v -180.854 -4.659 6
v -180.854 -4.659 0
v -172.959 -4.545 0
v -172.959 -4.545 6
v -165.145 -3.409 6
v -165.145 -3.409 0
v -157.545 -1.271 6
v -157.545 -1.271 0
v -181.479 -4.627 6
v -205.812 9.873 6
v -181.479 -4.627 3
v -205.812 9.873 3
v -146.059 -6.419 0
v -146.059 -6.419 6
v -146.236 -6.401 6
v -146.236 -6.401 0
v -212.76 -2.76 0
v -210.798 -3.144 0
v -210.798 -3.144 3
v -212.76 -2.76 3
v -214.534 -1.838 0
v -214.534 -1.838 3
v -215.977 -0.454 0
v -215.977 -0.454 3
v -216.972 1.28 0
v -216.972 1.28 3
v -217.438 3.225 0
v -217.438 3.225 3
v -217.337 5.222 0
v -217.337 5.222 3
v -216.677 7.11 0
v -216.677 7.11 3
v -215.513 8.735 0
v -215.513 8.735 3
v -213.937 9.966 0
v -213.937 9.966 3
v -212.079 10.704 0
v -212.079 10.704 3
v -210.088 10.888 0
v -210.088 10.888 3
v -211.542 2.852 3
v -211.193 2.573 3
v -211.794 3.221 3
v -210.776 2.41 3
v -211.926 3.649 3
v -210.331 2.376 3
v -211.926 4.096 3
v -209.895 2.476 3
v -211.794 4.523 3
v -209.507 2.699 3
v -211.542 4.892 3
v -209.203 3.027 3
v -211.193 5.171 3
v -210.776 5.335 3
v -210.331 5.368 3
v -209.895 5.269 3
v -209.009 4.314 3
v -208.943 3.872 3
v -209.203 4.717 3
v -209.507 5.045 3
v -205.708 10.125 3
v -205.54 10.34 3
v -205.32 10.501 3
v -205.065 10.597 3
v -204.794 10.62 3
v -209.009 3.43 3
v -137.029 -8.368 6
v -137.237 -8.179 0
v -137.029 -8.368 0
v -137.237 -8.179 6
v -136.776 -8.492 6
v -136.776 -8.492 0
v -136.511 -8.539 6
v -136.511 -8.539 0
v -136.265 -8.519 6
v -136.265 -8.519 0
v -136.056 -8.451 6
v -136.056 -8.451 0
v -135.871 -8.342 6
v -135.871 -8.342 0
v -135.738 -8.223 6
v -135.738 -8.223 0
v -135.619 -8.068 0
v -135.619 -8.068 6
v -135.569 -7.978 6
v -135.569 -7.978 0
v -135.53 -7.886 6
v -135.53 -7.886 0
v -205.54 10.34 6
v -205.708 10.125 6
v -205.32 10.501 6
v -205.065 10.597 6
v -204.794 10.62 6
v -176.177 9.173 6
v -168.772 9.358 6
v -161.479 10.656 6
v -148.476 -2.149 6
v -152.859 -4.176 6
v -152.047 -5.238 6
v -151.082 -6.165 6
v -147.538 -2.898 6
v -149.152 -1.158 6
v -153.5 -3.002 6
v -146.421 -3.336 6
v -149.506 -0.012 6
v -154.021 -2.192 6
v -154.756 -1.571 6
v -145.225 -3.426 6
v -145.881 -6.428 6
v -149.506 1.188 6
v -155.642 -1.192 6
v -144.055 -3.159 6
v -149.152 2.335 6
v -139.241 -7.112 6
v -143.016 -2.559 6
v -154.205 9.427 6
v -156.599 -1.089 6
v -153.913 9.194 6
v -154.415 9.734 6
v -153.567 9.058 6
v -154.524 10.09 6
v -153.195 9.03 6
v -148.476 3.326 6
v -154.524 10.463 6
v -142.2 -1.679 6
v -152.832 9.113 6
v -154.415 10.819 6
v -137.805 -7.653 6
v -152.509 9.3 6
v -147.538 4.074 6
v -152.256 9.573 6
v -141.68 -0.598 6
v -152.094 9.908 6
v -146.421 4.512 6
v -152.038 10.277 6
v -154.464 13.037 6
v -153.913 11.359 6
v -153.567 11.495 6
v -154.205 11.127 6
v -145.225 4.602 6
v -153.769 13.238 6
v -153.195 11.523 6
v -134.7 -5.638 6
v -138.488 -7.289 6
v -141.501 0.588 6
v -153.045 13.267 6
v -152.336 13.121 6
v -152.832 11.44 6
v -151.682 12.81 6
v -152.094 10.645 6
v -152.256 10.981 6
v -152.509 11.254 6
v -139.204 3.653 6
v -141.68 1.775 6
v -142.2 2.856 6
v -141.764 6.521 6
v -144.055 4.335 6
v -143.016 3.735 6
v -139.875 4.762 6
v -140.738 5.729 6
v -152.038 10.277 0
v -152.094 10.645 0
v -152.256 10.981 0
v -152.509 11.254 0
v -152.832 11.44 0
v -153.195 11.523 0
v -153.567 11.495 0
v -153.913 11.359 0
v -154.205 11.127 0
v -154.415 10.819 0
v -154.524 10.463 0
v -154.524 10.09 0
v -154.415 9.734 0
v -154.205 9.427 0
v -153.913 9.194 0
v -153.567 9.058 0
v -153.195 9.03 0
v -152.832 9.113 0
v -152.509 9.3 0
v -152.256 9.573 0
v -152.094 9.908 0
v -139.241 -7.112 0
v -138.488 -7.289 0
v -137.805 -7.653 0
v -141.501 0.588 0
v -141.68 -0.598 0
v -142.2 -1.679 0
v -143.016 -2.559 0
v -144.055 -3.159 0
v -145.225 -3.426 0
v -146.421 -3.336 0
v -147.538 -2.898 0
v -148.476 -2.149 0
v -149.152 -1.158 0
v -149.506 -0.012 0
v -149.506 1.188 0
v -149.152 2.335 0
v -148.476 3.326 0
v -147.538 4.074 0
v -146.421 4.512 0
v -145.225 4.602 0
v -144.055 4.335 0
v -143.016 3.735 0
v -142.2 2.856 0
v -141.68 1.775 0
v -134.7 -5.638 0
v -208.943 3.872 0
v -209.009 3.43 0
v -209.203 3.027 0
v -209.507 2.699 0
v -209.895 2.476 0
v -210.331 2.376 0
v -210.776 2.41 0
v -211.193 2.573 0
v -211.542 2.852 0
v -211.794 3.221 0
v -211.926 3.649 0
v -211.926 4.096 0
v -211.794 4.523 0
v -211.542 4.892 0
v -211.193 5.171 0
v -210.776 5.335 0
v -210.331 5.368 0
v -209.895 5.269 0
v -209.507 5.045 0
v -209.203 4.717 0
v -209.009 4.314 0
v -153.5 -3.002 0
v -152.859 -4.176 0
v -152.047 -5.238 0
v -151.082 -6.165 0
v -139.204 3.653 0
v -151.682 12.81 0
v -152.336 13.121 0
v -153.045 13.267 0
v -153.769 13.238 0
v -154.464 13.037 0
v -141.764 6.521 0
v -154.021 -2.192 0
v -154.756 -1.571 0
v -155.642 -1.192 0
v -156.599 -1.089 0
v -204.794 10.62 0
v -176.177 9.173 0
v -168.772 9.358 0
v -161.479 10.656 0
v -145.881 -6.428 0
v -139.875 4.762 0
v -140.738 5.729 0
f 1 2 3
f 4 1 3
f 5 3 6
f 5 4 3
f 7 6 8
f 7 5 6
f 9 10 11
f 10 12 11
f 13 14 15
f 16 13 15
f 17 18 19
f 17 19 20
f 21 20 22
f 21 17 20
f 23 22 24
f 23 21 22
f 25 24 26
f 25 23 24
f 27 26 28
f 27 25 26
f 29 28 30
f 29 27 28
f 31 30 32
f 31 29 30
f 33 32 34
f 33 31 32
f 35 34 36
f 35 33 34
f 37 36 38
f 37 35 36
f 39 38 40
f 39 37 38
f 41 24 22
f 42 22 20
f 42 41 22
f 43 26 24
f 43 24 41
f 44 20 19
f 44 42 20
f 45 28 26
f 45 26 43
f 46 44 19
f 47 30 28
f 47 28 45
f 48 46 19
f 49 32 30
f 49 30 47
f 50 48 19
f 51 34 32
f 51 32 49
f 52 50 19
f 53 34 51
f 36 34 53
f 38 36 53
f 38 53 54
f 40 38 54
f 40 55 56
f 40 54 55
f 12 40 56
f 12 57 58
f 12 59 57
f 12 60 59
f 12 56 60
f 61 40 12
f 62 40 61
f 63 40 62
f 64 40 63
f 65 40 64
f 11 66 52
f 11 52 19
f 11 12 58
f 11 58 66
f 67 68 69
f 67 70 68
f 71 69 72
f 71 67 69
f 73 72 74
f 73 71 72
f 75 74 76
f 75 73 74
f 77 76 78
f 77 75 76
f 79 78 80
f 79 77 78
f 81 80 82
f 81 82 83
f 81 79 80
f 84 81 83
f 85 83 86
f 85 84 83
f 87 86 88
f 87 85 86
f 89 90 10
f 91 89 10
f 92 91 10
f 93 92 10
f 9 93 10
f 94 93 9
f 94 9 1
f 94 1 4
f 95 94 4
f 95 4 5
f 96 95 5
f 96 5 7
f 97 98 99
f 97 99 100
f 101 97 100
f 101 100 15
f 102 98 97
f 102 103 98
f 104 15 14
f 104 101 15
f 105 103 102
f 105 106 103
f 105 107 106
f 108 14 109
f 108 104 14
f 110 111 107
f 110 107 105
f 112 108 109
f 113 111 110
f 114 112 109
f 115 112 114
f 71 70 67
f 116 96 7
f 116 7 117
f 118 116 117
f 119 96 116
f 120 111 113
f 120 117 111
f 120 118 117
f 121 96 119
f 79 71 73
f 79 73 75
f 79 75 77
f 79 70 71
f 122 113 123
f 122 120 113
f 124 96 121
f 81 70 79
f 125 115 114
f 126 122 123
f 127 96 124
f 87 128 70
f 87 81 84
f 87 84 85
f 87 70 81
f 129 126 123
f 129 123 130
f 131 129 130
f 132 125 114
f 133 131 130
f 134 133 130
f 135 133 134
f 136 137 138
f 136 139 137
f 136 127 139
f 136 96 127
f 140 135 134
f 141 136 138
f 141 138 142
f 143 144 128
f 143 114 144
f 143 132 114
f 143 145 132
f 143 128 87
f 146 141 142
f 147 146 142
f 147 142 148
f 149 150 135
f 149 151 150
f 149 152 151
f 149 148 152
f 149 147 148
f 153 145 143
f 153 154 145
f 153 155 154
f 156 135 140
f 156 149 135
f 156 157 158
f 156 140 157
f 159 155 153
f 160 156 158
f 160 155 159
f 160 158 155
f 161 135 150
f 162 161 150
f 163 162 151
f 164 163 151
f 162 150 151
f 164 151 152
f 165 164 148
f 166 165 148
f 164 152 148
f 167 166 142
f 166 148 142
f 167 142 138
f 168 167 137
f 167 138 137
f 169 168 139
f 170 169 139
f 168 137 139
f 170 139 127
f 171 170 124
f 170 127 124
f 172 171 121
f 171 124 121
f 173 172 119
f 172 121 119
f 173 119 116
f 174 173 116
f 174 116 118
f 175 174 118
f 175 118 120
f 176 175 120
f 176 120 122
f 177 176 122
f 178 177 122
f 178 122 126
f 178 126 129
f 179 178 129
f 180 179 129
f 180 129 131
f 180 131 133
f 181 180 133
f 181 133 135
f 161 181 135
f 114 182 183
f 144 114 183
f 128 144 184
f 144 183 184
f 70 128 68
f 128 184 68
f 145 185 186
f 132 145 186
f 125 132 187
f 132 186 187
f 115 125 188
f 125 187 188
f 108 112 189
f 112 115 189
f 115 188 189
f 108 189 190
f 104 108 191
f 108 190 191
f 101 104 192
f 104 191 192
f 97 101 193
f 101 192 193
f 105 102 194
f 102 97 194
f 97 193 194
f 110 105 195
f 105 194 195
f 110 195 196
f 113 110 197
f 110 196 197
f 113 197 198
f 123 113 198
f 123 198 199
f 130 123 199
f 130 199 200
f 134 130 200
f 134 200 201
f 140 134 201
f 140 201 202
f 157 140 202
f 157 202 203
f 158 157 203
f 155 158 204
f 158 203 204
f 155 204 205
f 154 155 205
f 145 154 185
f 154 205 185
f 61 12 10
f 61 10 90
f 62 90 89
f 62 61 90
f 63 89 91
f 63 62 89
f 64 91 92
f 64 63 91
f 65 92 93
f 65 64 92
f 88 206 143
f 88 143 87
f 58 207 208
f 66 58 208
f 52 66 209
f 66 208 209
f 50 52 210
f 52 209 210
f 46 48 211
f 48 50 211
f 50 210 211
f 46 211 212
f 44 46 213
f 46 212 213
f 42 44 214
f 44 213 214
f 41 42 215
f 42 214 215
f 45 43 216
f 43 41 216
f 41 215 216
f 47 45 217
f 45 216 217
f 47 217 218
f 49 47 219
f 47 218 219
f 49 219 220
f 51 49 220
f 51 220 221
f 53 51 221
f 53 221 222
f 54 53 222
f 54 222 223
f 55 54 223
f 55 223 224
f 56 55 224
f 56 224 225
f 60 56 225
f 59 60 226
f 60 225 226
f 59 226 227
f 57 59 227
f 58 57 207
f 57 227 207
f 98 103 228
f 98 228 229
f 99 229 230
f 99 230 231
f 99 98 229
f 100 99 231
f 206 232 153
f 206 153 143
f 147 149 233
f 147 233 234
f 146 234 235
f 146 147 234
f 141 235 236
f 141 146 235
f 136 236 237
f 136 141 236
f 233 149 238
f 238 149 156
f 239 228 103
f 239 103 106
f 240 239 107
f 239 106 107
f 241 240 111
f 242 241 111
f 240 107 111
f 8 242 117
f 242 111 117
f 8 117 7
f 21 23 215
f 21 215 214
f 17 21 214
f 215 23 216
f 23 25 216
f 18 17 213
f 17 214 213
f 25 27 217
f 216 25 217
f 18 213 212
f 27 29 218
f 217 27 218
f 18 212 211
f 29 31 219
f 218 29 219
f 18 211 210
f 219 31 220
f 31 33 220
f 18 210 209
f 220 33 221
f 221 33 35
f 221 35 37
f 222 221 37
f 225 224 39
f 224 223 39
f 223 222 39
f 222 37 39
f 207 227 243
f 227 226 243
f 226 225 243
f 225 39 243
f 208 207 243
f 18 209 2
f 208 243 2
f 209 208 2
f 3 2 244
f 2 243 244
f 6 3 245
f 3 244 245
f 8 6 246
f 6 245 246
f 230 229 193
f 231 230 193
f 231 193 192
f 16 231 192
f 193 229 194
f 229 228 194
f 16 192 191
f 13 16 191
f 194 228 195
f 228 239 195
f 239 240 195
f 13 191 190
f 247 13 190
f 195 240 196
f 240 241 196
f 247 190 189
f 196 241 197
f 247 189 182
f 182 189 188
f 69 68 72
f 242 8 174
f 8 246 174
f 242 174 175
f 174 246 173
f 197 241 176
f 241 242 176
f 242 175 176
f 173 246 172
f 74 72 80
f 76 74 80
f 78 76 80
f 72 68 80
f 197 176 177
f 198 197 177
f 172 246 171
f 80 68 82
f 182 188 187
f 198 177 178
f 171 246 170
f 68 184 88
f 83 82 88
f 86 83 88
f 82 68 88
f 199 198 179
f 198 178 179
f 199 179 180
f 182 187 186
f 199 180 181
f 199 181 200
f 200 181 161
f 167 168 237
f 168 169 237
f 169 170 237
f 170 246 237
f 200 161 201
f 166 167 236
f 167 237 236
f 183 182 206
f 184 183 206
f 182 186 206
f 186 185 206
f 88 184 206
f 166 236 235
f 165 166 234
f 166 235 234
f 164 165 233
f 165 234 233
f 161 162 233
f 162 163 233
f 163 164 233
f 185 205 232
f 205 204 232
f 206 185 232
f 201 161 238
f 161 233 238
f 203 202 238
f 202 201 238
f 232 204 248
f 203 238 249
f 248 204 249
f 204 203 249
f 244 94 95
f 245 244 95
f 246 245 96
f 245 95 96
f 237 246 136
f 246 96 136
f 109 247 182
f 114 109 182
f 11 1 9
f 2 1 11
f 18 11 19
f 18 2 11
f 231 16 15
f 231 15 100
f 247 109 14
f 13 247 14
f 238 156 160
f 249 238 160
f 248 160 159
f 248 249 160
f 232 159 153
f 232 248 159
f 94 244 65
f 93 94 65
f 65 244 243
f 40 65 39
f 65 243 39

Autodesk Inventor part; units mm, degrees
ref_plane "YZ Plane" through (0, 0, 0) normal (1, 0, 0) x (0, 1, 0)
ref_plane "XZ Plane" through (0, 0, 0) normal (0, 1, 0) x (-1, 0, 0)
ref_plane "XY Plane" through (0, 0, 0) normal (0, 0, 1) x (1, 0, 0)
sketch "スケッチ1" plane through (0, 0, 0) normal (0, 0, 1) x (1, 0, 0)
  circle A0 centre (-145.5257, 0.5882) radius 1.5
  circle A1 centre (-139.5445, -10.0968) radius 1.5
  circle A2 centre (-105.5257, -16.4118) radius 30.1 construction
  line L0 (-170.915, -81.4118) -> (490.0044, -81.4118)
  circle A3 centre (-145.5257, 0.5882) radius 4.025
  circle A4 centre (-139.5445, -10.0968) radius 3
  circle A5 centre (-145.5257, 0.5882) radius 7.025
  line L1 (-146.2365, -6.4007) -> (-139.241, -7.1122)
  line L2 (-139.2044, 3.6529) -> (-134.6999, -5.6381)
  line L3 (-134.6999, -5.6381) -> (-136.7303, -11.1361)
  circle A6 centre (-105.5257, -16.4118) radius 31.1 construction
  line L4 (-145.1707, 7.6042) -> (-210.0877, 10.8882)
  line L5 (-145.8806, -6.4278) -> (-210.7976, -3.1438)
  circle A7 centre (-210.4427, 3.8722) radius 1.5
  circle A8 centre (-210.4427, 3.8722) radius 4.025
  circle A9 centre (-210.4427, 3.8722) radius 7.025
  circle A10 centre (-210.4427, 3.8722) radius 7.525
  line L6 (-206.5907, 10.3366) -> (-181.4786, -4.627)
  circle A11 centre (-199.4194, 13.3524) radius 1.25
  arc A12 (-199.5709, 10.3562) -> (-202.1936, 14.494) centre (-199.4194, 13.3524) ccw
  line L7 (-202.1936, 14.494) -> (-247.2482, 16.7732)
  arc A13 (-289.8377, 39.1951) -> (-247.2482, 16.7732) centre (-244.3571, 73.9244) ccw
  arc A14 (-289.8377, 39.1951) -> (-291.5649, 38.2266) centre (-290.6325, 38.5882) ccw
  arc A15 (-291.5649, 38.2266) -> (-251.8636, 4.9117) centre (-241.4172, 57.674) ccw
  line L8 (-251.8636, 4.9117) -> (-211.807, -3.019)
  line L9 (-209.3045, 11.3106) -> (-204.7936, 10.6204)
  arc A16 (-204.7936, 10.6204) -> (-205.5417, 8.9052) centre (-204.8441, 9.6217) ccw
  line L10 (-210.5022, 11.397) -> (-238.3358, 2.2334)
  point P0 (0, 0)
  point P1 (0, 0)
  point P2 (-146.0589, -6.4188)
  point P3 (-205.8121, 9.8726)
  dimension "d0" = 6
  dimension "d1" = 8.05
  dimension "d2" = 3
  dimension "d3" = 1
  dimension "d4" = 3
  dimension "d5" = 8.05
  dimension "d6" = 3
  dimension "d7" = 0.5
  dimension "d8" = 2.5
  dimension "d9" = 6
  dimension "d10" = 2
  dimension "d11" = 120
  dimension "d12" = 4
  dimension "d13" = 150
  dimension "d14" = 1
  dimension "d15" = 65
  dimension "d16" = 87.382
extrude "押し出し1" add sketch "スケッチ1" along normal blind 6 contours A4 L1 L5 A5 L2 L3 | L5 L6 A16 L4 A5 L1 | A5
extrude "押し出し2" add sketch "スケッチ1" along normal blind 3 contours L5 A10 A16 L6 | L5 A9 A16 A10 | A16 A10 L6 | L6 A10 L4 A16 | A9 | A10 A16 A9 L4 | A8
fillet "フィレット1" radius 1 1 edges at (-136.7303, -11.1361, 3)
sketch "スケッチ2" plane through (0, 0, 6) normal (0, 0, 1) x (1, 0, 0)
  line L0 (-210.7976, -3.1438) -> (-181.4786, -4.627) projected
  line L1 (-205.8121, 9.8726) -> (-181.4786, -4.627) projected
  arc A0 (-204.7936, 10.6204) -> (-205.8121, 9.8726) centre (-204.8441, 9.6217) ccw projected
  line L2 (-204.7936, 10.6204) -> (-210.0877, 10.8882) projected
  arc A1 (-210.0877, 10.8882) -> (-210.7976, -3.1438) centre (-210.4427, 3.8722) ccw projected
  circle A2 centre (-210.4427, 3.8722) radius 1.5 projected
  arc A3 (-137.2374, -8.1793) -> (-135.5302, -7.8865) centre (-136.4683, -7.5401) ccw projected
  line L3 (-135.5302, -7.8865) -> (-134.6999, -5.6381) projected
  line L4 (-134.6999, -5.6381) -> (-139.2044, 3.6529) projected
  arc A4 (-139.2044, 3.6529) -> (-145.1707, 7.6042) centre (-145.5257, 0.5882) ccw projected
  line L5 (-145.1707, 7.6042) -> (-204.7936, 10.6204) projected
  arc A5 (-204.7936, 10.6204) -> (-205.8121, 9.8726) centre (-204.8441, 9.6217) ccw projected
  line L6 (-205.8121, 9.8726) -> (-181.4786, -4.627) projected
  line L7 (-181.4786, -4.627) -> (-146.0589, -6.4188) projected
  line L8 (-146.0589, -6.4188) -> (-146.2365, -6.4007) projected
  arc A6 (-146.2365, -6.4007) -> (-145.8806, -6.4278) centre (-145.5257, 0.5882) ccw projected
  line L9 (-145.8806, -6.4278) -> (-146.0589, -6.4188) projected
  line L10 (-146.0589, -6.4188) -> (-139.241, -7.1122) projected
  arc A7 (-137.2374, -8.1793) -> (-139.241, -7.1122) centre (-139.5445, -10.0968) ccw projected
  circle A8 centre (-145.5257, 0.5882) radius 4.025 projected
  arc A9 (-204.7936, 10.6204) -> (-205.8121, 9.8726) centre (-204.8441, 9.6217) ccw projected
  line L11 (-204.6925, 12.6179) -> (-209.9867, 12.8857)
  arc A10 (-209.9867, 12.8857) -> (-210.8986, -5.1413) centre (-210.4427, 3.8722) ccw
  arc A11 (-182.0757, -6.5994) -> (-181.4786, -4.627) centre (-182.022, -5.539) ccw
  line L12 (-210.8986, -5.1413) -> (-182.0757, -6.5994)
  arc A12 (-204.7936, 10.6204) -> (-204.6925, 12.6179) centre (-204.743, 11.6191) ccw
  point P0 (0, 0)
  dimension "d22" = 2
sketch "スケッチ3" plane through (0, 0, 6) normal (0, 0, 1) x (1, 0, 0)
  arc A0 (-137.2374, -8.1793) -> (-135.5302, -7.8865) centre (-136.4683, -7.5401) ccw projected
  line L0 (-135.5302, -7.8865) -> (-134.6999, -5.6381) projected
  line L1 (-134.6999, -5.6381) -> (-139.2044, 3.6529) projected
  arc A1 (-139.2044, 3.6529) -> (-145.1707, 7.6042) centre (-145.5257, 0.5882) ccw projected
  line L2 (-145.1707, 7.6042) -> (-204.7936, 10.6204) projected
  arc A2 (-204.7936, 10.6204) -> (-205.8121, 9.8726) centre (-204.8441, 9.6217) ccw projected
  line L3 (-205.8121, 9.8726) -> (-181.4786, -4.627) projected
  line L4 (-181.4786, -4.627) -> (-146.0589, -6.4188) projected
  line L5 (-146.0589, -6.4188) -> (-146.2365, -6.4007) projected
  arc A3 (-146.2365, -6.4007) -> (-145.8806, -6.4278) centre (-145.5257, 0.5882) ccw projected
  line L6 (-145.8806, -6.4278) -> (-146.0589, -6.4188) projected
  line L7 (-146.0589, -6.4188) -> (-139.241, -7.1122) projected
  arc A4 (-137.2374, -8.1793) -> (-139.241, -7.1122) centre (-139.5445, -10.0968) ccw projected
  circle A5 centre (-145.5257, 0.5882) radius 4.025 projected
  point P0 (0, 0)
extrude "押し出し3" add sketch "スケッチ3" against normal blind 6 contours L5 A3 L6
sketch "スケッチ4" plane through (0, 0, 6) normal (0, 0, 1) x (1, 0, 0)
  line L0 (-146.0589, -6.4188) -> (-139.241, -7.1122) projected
  arc A0 (-137.2374, -8.1793) -> (-139.241, -7.1122) centre (-139.5445, -10.0968) ccw projected
  arc A1 (-137.2374, -8.1793) -> (-135.5302, -7.8865) centre (-136.4683, -7.5401) ccw projected
  line L1 (-135.5302, -7.8865) -> (-134.6999, -5.6381) projected
  line L2 (-134.6999, -5.6381) -> (-139.2044, 3.6529) projected
  arc A2 (-139.2044, 3.6529) -> (-145.1707, 7.6042) centre (-145.5257, 0.5882) ccw projected
  line L3 (-145.1707, 7.6042) -> (-204.7936, 10.6204) projected
  arc A3 (-204.7936, 10.6204) -> (-205.8121, 9.8726) centre (-204.8441, 9.6217) ccw projected
  line L4 (-205.8121, 9.8726) -> (-181.4786, -4.627) projected
  line L5 (-181.4786, -4.627) -> (-146.0589, -6.4188) projected
  circle A4 centre (-145.5257, 0.5882) radius 4.025 projected
  arc A5 (-153.4999, -3.002) -> (-157.5446, -1.2714) centre (-156.4634, -4.3363) ccw
  arc A6 (-180.854, -4.6586) -> (-157.5446, -1.2714) centre (-177.7808, 56.0903) ccw
  line L6 (-181.4786, -4.627) -> (-146.0589, -6.4188) projected
  circle A7 centre (-139.5445, -10.0968) radius 3 projected
  arc A8 (-153.4999, -3.002) -> (-151.0823, -6.1647) centre (-145.5257, 0.5882) ccw
  line L7 (-145.1707, 7.6042) -> (-204.7936, 10.6204) projected
  arc A9 (-176.1768, 9.1728) -> (-154.4643, 13.0367) centre (-173.6978, 58.1782) ccw
  arc A10 (-151.6818, 12.8103) -> (-154.4643, 13.0367) centre (-153.2884, 10.2768) ccw
  line L8 (-151.6818, 12.8103) -> (-141.7636, 6.5209)
  circle A11 centre (-153.2884, 10.2768) radius 1.25
  circle A12 centre (-139.5445, -10.0968) radius 3.5
  point P0 (0, 0)
  point P1 (-176.1768, 9.1728)
  dimension "d25" = 3.25
  dimension "d26" = 95
  dimension "d27" = 3
  dimension "d28" = 2.5
  dimension "d29" = 0.5
extrude "押し出し4" cut sketch "スケッチ4" against normal blind 6 contours L5 A6 A5 A8
extrude "押し出し5" add sketch "スケッチ4" against normal blind 6 contours A2 L3 A9 A10 L8
sketch "スケッチ5" plane through (0, 0, 6) normal (0, 0, 1) x (1, 0, 0)
  circle A0 centre (-153.2884, 10.2768) radius 1.25 projected
  circle A1 centre (-145.5257, 0.5882) radius 4.025 projected
  arc A2 (-180.854, -4.6586) -> (-157.5446, -1.2714) centre (-177.7808, 56.0903) ccw projected
  arc A3 (-153.4999, -3.002) -> (-157.5446, -1.2714) centre (-156.4634, -4.3363) ccw projected
  arc A4 (-153.4999, -3.002) -> (-151.0823, -6.1647) centre (-145.5257, 0.5882) ccw projected
  line L0 (-151.0823, -6.1647) -> (-146.0589, -6.4188) projected
  line L1 (-146.0589, -6.4188) -> (-139.241, -7.1122) projected
  arc A5 (-137.2374, -8.1793) -> (-139.241, -7.1122) centre (-139.5445, -10.0968) ccw projected
  arc A6 (-137.2374, -8.1793) -> (-135.5302, -7.8865) centre (-136.4683, -7.5401) ccw projected
  line L2 (-135.5302, -7.8865) -> (-134.6999, -5.6381) projected
  line L3 (-134.6999, -5.6381) -> (-139.2044, 3.6529) projected
  arc A7 (-139.2044, 3.6529) -> (-141.7636, 6.5209) centre (-145.5257, 0.5882) ccw projected
  line L4 (-141.7636, 6.5209) -> (-151.6818, 12.8103) projected
  arc A8 (-151.6818, 12.8103) -> (-154.4643, 13.0367) centre (-153.2884, 10.2768) ccw projected
  arc A9 (-176.1768, 9.1728) -> (-154.4643, 13.0367) centre (-173.6978, 58.1782) ccw projected
  line L5 (-176.1768, 9.1728) -> (-204.7936, 10.6204) projected
  arc A10 (-204.7936, 10.6204) -> (-205.8121, 9.8726) centre (-204.8441, 9.6217) ccw projected
  line L6 (-205.8121, 9.8726) -> (-181.4786, -4.627) projected
  line L7 (-181.4786, -4.627) -> (-180.854, -4.6586) projected
  line L8 (-204.7936, 10.6204) -> (-210.0877, 10.8882) projected
  arc A11 (-210.0877, 10.8882) -> (-210.7976, -3.1438) centre (-210.4427, 3.8722) ccw projected
  line L9 (-210.7976, -3.1438) -> (-181.4786, -4.627) projected
  line L10 (-205.8121, 9.8726) -> (-181.4786, -4.627) projected
  arc A12 (-204.7936, 10.6204) -> (-205.8121, 9.8726) centre (-204.8441, 9.6217) ccw projected
  circle A13 centre (-210.4427, 3.8722) radius 1.5 projected
  arc A14 (-204.7936, 10.6204) -> (-205.8121, 9.8726) centre (-204.8441, 9.6217) ccw projected
  arc A15 (-204.7936, 10.6204) -> (-204.6925, 12.6179) centre (-204.743, 11.6191) ccw
  line L11 (-204.6925, 12.6179) -> (-209.9867, 12.8857)
  arc A16 (-209.9867, 12.8857) -> (-210.8986, -5.1413) centre (-210.4427, 3.8722) ccw
  line L12 (-210.8986, -5.1413) -> (-182.0757, -6.5994)
  arc A17 (-182.0757, -6.5994) -> (-181.4786, -4.627) centre (-182.022, -5.539) ccw
  line L13 (-205.8121, 9.8726) -> (-181.4786, -4.627) projected
  point P0 (0, 0)
  dimension "d34" = 2
properties part number "後ろウイング根本" material "ポリカーボネート、クリア"
